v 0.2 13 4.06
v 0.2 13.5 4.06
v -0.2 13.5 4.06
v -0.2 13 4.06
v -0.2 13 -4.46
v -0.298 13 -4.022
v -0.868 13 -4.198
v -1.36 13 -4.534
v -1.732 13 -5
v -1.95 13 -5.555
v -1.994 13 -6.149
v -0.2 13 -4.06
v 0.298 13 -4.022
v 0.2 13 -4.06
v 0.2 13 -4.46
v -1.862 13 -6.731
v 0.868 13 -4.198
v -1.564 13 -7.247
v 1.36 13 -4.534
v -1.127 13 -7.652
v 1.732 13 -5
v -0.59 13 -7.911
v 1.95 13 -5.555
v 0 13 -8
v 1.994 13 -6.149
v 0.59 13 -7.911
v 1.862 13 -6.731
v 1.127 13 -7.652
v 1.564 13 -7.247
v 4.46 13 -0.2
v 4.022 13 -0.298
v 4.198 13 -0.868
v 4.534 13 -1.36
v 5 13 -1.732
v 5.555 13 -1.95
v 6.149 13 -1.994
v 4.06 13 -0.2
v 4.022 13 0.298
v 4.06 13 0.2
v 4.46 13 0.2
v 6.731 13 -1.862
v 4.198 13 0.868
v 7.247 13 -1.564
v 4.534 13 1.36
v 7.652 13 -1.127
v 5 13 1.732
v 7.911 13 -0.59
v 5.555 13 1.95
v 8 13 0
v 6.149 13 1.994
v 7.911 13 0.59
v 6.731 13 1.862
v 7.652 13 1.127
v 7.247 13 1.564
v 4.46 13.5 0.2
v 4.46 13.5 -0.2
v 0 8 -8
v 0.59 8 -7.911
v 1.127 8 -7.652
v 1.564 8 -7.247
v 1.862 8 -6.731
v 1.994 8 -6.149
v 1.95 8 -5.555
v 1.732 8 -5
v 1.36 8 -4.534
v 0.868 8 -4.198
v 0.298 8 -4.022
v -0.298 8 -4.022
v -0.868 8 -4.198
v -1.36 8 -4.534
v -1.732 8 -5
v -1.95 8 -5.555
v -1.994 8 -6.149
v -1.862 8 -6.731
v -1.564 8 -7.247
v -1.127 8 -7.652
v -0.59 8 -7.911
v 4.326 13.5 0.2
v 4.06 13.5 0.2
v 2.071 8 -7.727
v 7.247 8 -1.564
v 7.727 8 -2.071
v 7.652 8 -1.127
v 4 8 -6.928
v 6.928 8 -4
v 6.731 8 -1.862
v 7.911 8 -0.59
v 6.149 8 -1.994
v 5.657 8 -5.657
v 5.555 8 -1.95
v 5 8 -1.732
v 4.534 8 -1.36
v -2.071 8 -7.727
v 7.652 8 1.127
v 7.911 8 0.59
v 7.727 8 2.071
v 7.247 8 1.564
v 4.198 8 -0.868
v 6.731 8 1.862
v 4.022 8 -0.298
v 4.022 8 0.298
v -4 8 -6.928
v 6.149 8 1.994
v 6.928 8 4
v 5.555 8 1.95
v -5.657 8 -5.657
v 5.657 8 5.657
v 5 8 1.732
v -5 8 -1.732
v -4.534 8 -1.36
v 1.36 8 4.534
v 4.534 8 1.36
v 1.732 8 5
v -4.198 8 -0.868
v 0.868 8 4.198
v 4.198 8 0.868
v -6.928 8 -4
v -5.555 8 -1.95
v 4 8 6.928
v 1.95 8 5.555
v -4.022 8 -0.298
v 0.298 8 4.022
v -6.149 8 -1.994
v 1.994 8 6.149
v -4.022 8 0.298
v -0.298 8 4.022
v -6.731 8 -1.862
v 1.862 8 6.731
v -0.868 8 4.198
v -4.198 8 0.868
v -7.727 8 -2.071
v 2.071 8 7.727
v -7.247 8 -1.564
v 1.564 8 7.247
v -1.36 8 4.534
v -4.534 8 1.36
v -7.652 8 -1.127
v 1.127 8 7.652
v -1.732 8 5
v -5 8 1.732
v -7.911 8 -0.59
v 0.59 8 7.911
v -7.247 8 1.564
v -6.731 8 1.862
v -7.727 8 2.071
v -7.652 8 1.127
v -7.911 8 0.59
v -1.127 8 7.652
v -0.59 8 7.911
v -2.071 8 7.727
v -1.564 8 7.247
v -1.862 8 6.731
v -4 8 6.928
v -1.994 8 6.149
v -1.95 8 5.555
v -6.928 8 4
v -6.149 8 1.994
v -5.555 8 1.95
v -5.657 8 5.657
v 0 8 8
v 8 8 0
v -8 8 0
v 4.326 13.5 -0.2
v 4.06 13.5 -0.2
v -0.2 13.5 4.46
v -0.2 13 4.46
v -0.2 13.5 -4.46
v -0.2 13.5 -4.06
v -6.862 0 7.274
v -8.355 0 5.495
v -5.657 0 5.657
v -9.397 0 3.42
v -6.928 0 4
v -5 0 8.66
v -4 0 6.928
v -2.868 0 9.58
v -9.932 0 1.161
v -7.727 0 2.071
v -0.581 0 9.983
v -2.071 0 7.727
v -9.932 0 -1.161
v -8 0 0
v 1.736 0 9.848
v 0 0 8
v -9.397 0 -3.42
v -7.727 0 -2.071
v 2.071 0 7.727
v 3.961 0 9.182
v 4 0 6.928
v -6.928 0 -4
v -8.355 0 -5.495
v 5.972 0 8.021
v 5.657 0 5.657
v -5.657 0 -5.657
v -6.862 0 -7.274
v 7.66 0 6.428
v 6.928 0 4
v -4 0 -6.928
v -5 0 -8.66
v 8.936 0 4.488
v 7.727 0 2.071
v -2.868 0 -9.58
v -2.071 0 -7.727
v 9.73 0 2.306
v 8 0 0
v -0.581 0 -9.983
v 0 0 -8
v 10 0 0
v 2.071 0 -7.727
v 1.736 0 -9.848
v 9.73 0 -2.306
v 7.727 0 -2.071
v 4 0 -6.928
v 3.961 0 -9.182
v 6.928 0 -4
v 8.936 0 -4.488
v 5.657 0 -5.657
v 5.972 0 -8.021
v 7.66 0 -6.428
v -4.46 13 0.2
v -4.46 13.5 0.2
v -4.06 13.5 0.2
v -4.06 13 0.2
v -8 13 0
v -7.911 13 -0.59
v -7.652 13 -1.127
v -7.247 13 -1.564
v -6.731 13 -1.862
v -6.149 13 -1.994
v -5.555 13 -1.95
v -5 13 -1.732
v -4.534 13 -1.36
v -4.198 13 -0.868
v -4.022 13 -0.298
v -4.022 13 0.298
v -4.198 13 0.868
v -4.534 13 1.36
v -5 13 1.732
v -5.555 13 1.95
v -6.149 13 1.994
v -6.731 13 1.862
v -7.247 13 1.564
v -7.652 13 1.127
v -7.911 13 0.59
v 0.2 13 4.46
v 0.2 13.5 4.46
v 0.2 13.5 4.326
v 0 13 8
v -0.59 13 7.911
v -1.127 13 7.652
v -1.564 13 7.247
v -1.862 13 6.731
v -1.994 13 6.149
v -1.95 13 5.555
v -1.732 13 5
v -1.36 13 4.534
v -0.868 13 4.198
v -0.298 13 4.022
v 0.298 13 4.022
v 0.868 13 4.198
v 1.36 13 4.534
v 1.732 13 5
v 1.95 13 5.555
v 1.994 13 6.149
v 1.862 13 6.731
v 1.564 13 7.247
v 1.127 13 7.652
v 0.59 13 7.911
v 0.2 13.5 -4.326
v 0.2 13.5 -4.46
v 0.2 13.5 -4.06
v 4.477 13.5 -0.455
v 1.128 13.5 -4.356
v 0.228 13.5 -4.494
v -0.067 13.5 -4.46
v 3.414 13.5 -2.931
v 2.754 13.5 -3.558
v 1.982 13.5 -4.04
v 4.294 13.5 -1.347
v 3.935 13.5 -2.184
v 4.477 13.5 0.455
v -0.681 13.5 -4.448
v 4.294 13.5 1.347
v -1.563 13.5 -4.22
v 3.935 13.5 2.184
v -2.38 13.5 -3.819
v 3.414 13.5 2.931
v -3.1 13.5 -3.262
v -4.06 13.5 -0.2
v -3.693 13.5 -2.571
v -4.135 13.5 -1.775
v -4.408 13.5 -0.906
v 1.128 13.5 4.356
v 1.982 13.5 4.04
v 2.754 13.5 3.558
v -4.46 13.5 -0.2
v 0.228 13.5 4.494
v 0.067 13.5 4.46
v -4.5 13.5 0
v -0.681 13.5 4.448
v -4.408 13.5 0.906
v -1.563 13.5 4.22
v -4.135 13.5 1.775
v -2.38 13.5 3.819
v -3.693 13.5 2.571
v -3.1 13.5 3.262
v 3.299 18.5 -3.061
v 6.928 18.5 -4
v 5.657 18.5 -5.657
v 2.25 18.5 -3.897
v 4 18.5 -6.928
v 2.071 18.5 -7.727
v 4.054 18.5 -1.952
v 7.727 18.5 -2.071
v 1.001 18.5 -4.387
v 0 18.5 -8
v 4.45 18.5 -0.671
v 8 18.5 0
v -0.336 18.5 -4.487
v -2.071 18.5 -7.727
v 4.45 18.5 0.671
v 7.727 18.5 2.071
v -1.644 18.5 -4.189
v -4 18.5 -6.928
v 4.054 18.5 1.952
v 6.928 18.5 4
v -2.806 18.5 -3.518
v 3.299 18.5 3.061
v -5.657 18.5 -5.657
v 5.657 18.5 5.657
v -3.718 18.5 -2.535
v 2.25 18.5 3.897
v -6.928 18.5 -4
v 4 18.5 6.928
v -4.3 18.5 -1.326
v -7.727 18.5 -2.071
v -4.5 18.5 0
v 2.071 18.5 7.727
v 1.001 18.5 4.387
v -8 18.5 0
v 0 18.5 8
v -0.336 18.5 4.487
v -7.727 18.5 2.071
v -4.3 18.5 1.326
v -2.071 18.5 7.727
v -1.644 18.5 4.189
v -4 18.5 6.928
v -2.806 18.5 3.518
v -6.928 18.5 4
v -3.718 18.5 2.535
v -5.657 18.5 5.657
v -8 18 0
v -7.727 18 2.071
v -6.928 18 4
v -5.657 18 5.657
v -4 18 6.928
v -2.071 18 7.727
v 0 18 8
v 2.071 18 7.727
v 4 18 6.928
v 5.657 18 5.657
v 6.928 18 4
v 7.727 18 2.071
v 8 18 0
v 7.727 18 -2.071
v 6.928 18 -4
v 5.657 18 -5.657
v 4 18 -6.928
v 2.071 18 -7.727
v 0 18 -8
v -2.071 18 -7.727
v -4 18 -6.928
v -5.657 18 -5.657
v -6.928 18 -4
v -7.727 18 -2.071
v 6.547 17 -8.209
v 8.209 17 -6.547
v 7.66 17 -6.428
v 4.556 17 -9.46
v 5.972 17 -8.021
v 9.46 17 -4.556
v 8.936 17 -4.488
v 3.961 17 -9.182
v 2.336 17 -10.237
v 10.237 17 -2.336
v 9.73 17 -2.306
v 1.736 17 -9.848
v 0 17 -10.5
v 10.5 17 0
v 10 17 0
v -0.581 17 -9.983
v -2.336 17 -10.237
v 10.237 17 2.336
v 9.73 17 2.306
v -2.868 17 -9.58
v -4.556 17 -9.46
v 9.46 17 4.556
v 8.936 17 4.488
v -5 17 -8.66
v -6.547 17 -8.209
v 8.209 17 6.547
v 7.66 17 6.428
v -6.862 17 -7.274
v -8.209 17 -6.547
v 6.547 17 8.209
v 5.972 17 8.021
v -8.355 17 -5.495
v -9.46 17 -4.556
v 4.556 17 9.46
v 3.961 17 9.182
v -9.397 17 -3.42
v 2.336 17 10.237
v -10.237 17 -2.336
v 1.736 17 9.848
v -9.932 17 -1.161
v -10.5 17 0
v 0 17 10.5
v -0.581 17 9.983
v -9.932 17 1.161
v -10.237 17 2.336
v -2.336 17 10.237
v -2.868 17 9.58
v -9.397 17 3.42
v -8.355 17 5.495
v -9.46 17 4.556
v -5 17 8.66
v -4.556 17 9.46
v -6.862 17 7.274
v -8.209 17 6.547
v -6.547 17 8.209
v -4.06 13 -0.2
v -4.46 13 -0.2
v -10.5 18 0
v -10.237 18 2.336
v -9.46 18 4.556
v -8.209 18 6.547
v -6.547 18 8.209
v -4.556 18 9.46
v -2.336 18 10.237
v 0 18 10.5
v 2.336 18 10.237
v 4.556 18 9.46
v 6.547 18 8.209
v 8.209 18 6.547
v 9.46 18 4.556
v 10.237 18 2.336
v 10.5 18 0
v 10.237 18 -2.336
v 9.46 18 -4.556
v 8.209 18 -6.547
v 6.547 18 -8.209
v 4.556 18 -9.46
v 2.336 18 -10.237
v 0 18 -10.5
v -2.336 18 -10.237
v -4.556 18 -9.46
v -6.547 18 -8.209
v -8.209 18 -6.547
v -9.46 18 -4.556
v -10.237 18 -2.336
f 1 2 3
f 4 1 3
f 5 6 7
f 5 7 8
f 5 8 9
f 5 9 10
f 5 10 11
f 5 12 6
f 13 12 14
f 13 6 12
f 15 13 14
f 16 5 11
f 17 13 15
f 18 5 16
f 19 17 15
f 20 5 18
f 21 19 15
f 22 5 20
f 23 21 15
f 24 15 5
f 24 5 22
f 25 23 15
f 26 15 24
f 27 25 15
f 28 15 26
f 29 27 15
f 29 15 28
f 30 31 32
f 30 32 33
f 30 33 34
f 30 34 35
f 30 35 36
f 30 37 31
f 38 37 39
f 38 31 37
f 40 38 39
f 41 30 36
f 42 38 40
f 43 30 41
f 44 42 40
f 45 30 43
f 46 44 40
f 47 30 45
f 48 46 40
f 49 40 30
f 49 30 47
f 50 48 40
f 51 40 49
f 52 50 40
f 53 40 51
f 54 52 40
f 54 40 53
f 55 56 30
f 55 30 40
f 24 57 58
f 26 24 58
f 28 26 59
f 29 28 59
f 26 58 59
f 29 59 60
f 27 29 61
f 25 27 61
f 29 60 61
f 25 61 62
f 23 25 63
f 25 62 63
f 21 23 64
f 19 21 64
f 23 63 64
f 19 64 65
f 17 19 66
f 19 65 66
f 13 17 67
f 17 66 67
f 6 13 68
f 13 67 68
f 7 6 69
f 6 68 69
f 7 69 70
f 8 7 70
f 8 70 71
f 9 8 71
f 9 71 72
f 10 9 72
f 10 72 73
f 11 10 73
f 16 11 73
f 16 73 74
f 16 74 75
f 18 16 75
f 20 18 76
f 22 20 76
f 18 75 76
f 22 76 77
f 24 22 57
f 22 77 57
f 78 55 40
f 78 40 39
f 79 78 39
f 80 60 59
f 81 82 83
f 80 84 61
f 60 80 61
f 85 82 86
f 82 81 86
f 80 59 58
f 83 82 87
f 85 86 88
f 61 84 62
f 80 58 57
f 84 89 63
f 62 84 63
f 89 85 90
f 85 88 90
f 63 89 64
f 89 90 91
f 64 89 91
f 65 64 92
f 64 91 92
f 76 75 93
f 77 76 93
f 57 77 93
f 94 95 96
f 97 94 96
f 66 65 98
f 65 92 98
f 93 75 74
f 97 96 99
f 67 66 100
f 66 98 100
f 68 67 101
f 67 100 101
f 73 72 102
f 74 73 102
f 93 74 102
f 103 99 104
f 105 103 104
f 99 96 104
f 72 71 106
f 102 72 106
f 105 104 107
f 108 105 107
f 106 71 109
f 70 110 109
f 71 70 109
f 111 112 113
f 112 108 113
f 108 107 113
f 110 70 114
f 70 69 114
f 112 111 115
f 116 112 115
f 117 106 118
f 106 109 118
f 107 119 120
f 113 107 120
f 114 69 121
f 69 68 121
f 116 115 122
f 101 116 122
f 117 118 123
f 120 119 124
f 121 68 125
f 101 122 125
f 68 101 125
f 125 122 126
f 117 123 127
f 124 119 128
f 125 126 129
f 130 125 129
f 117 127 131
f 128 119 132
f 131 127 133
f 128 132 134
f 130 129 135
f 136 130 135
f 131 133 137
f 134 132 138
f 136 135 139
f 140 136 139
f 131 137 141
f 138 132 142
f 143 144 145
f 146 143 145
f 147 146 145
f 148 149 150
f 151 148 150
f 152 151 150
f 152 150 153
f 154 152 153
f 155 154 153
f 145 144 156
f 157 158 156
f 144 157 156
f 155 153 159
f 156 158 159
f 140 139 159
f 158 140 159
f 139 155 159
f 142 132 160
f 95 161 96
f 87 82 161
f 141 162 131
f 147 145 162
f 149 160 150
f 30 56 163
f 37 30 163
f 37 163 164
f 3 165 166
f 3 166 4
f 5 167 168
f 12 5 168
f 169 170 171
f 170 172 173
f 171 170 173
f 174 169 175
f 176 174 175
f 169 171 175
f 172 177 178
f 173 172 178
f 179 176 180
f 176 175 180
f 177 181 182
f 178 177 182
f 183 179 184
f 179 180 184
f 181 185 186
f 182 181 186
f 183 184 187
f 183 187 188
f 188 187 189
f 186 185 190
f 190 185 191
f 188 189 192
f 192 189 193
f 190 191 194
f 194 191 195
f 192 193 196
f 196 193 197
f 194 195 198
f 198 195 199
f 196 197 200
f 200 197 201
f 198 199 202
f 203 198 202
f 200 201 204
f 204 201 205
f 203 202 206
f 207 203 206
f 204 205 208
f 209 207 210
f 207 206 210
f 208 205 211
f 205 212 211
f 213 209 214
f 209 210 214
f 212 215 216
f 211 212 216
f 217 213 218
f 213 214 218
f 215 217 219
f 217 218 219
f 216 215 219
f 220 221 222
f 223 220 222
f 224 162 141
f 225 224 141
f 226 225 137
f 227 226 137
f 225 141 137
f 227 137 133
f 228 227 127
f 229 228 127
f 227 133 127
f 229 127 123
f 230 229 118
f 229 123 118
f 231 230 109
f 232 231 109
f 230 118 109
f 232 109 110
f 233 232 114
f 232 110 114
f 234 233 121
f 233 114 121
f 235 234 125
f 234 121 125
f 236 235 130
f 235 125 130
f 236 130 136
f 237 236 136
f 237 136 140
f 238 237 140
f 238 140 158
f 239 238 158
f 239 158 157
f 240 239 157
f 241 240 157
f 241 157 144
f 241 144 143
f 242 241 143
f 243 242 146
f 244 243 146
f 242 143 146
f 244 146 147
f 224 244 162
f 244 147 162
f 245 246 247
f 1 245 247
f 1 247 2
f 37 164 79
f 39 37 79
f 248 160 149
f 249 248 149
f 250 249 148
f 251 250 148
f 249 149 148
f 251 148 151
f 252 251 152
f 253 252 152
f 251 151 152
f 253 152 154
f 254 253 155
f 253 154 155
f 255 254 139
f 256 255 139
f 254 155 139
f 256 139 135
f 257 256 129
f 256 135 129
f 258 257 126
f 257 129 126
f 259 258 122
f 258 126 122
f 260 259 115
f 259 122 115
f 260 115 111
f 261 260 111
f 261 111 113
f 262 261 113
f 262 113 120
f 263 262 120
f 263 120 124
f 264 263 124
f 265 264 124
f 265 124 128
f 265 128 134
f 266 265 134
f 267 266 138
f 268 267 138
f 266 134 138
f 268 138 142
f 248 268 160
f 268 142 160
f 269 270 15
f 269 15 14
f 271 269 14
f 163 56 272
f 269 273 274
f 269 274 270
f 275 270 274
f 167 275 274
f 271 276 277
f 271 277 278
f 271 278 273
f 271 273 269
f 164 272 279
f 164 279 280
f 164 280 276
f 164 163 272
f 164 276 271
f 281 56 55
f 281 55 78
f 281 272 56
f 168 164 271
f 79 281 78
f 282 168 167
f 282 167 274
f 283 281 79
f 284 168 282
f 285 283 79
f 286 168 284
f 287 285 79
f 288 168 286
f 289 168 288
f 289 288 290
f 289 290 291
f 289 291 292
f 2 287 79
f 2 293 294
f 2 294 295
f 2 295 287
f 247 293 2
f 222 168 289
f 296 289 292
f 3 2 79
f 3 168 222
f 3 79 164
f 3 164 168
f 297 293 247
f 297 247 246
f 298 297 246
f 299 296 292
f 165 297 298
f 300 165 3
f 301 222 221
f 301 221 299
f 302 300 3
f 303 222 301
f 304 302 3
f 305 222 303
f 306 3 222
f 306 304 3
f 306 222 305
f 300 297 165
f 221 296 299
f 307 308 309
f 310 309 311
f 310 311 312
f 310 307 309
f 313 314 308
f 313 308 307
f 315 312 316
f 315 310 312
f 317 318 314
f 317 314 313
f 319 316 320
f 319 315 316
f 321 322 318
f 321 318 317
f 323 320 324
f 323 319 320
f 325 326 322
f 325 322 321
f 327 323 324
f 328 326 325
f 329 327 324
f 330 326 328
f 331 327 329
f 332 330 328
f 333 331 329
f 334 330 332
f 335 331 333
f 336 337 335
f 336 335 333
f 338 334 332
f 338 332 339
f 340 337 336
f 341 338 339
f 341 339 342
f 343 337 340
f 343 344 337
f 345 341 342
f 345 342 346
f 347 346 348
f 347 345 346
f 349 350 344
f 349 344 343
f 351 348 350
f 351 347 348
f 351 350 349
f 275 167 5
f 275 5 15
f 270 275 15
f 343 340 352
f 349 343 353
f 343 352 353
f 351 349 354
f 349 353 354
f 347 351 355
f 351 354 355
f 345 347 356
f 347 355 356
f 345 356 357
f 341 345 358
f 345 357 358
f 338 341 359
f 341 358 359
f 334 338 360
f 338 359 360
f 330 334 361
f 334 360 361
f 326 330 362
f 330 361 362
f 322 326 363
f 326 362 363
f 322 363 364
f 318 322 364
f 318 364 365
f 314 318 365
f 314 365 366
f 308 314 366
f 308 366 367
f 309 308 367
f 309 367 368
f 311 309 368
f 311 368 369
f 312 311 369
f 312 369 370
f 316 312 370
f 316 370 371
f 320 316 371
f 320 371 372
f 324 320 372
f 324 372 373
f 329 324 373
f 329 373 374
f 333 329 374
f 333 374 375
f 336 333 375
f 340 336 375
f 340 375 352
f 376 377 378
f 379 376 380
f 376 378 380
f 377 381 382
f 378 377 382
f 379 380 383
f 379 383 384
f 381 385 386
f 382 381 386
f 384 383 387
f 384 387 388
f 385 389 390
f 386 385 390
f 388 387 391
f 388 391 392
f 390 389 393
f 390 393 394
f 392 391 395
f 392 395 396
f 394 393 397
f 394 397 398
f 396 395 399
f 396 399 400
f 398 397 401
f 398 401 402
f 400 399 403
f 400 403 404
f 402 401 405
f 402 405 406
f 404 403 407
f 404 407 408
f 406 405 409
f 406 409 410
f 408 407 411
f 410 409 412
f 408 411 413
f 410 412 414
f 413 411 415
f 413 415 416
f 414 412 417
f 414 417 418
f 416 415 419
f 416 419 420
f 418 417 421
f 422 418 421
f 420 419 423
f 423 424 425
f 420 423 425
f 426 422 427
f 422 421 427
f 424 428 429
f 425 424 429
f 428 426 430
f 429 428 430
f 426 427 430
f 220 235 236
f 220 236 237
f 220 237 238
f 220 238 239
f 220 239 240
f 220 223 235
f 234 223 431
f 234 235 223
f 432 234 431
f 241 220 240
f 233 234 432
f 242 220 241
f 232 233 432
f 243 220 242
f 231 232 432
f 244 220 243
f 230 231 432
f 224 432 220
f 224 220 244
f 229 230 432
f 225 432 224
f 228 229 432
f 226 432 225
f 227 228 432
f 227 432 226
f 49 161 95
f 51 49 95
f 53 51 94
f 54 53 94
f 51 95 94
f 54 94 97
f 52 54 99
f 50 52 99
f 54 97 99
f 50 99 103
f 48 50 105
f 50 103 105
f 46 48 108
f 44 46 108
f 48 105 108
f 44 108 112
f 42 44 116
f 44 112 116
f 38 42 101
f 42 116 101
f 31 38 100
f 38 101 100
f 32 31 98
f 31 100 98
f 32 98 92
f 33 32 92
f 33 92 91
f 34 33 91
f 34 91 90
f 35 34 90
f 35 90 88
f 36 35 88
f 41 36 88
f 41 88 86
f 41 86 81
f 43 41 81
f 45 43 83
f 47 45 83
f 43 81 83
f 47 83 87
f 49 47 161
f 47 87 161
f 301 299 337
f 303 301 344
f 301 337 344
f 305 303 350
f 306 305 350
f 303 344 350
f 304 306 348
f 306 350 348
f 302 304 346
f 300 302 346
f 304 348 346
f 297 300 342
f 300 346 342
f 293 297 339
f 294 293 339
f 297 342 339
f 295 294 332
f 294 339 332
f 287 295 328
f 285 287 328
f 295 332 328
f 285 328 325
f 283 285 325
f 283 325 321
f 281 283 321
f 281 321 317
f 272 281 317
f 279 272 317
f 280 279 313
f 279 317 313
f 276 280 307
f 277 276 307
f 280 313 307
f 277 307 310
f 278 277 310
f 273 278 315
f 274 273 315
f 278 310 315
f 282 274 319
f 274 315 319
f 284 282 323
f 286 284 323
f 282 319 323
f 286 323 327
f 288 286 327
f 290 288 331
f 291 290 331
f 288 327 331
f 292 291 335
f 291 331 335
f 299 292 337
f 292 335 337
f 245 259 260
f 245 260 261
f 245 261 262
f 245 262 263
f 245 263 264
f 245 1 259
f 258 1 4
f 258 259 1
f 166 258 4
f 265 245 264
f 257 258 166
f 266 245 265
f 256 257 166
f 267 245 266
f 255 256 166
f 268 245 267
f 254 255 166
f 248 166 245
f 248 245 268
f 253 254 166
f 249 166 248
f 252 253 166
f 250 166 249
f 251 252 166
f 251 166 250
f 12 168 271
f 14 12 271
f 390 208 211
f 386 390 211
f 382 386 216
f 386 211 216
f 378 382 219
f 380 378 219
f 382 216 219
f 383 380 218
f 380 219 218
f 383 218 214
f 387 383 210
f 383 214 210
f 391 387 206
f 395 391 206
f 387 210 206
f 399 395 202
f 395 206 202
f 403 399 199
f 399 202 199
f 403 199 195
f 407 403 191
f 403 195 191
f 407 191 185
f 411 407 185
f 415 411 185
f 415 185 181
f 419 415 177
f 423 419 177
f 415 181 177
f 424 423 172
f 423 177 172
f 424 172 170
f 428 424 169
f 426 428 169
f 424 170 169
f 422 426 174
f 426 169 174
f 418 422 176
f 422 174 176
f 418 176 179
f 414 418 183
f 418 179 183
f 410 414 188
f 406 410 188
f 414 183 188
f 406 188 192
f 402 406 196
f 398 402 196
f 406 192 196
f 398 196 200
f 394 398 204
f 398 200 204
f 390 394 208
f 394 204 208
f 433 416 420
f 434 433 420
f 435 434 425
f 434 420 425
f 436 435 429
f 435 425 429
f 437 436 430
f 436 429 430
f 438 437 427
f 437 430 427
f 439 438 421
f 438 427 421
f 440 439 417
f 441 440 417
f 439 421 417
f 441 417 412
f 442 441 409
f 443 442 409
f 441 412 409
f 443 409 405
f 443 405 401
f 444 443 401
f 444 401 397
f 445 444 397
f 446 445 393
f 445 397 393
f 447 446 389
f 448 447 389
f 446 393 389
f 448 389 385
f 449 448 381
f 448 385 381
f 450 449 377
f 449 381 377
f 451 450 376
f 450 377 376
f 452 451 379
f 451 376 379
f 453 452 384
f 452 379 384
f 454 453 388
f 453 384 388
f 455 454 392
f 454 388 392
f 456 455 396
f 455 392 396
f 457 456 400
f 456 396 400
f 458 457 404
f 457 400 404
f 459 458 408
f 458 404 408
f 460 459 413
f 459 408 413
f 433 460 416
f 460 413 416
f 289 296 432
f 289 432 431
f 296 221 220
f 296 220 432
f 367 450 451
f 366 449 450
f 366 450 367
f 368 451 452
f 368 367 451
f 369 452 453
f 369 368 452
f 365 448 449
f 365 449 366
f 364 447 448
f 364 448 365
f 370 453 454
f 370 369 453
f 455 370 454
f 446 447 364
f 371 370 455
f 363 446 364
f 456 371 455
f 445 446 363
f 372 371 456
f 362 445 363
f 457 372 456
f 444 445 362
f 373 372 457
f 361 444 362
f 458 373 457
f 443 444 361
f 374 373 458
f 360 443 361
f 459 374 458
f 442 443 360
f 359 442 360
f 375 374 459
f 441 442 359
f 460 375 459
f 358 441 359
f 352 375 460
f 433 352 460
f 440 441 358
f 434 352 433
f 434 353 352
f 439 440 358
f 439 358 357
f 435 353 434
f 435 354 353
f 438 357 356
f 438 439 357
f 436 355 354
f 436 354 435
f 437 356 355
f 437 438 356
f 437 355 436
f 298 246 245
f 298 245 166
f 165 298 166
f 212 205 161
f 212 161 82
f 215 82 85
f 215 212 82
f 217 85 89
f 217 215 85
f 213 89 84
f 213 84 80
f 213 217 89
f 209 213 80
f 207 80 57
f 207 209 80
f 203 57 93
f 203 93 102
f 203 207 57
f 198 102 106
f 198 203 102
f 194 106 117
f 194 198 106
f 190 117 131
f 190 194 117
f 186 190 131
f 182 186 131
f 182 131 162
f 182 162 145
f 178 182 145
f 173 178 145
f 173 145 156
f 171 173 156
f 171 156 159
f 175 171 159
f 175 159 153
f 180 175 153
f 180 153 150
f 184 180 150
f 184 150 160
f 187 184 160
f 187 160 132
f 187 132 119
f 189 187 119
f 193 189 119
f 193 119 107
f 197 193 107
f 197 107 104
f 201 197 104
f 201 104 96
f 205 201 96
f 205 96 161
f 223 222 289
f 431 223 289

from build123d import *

# Parameters (mm, degrees)
SKETCH1_R          = 10
SKETCH1_R_2        = 8
EXTRUDE1_DEPTH     = 17
EXTRUDE3_START     = -9
SKETCH2_R          = 8
EXTRUDE3_DEPTH     = 10.5
SKETCH3_R          = 10.5
EXTRUDE4_DEPTH     = 1
SKETCH4_R          = 4.5
CUT_EXTRUDE1_DEPTH = 5
SKETCH6_R          = 2
CUT_EXTRUDE4_DEPTH = 5
CIRPATTERN1_COUNT  = 4
SKETCH7_W          = 0.4
SKETCH7_H          = 0.4
CUT_EXTRUDE5_DEPTH = 14.5
CIRPATTERN2_COUNT  = 4


with BuildPart() as part:
    # Sketch1 → Extrude1 (new body)
    with BuildSketch(Plane(origin=(0, 0, 0), x_dir=(1, 0, 0), z_dir=(0, 1, 0))):
        Circle(SKETCH1_R)
        Circle(SKETCH1_R_2, mode=Mode.SUBTRACT)
    extrude(amount=EXTRUDE1_DEPTH)

    # Sketch2 → Extrude3 (add)
    with BuildSketch(Plane(origin=(0, 17, 0), x_dir=(-1, 0, 0), z_dir=(0, 1, 0)).offset(EXTRUDE3_START)):
        Circle(SKETCH2_R)
    extrude(amount=EXTRUDE3_DEPTH)

    # Sketch3 → Extrude4 (add)
    with BuildSketch(Plane(origin=(0, 17, 0), x_dir=(-1, 0, 0), z_dir=(0, 1, 0))):
        Circle(SKETCH3_R)
    extrude(amount=EXTRUDE4_DEPTH)

    # Sketch4 → Cut-Extrude1 (cut)
    with BuildSketch(Plane(origin=(0, 18.5, 0), x_dir=(-1, 0, 0), z_dir=(0, 1, 0))):
        Circle(SKETCH4_R)
    extrude(amount=-CUT_EXTRUDE1_DEPTH, mode=Mode.SUBTRACT)

    # Sketch6 → Cut-Extrude4 (cut)
    with BuildSketch(Plane.XZ.offset(-8)):
        with Locations((6, 0)):
            Circle(SKETCH6_R)
    cut_extrude4 = extrude(amount=-CUT_EXTRUDE4_DEPTH, mode=Mode.SUBTRACT)

    # CirPattern1: Cut-Extrude4 ×4 about axis
    cirpattern1_axis = Axis((0, 0, 0), (0, 1, 0))
    for i in range(1, CIRPATTERN1_COUNT):
        add(cut_extrude4.rotate(cirpattern1_axis, i * 360 / CIRPATTERN1_COUNT), mode=Mode.SUBTRACT)

    # Sketch7 → Cut-Extrude5 (cut, through all)
    with BuildSketch(Plane(origin=(0, 13.5, 0), x_dir=(-1, 0, 0), z_dir=(0, 1, 0))):
        with Locations((-4.259587971, 0)):
            Rectangle(SKETCH7_W, SKETCH7_H)
    cut_extrude5 = extrude(amount=-CUT_EXTRUDE5_DEPTH, mode=Mode.SUBTRACT)

    # CirPattern2: Cut-Extrude5 ×4 about axis
    cirpattern2_axis = Axis((0, 0, 0), (0, 1, 0))
    for i in range(1, CIRPATTERN2_COUNT):
        add(cut_extrude5.rotate(cirpattern2_axis, i * 360 / CIRPATTERN2_COUNT), mode=Mode.SUBTRACT)


solid = part.part
